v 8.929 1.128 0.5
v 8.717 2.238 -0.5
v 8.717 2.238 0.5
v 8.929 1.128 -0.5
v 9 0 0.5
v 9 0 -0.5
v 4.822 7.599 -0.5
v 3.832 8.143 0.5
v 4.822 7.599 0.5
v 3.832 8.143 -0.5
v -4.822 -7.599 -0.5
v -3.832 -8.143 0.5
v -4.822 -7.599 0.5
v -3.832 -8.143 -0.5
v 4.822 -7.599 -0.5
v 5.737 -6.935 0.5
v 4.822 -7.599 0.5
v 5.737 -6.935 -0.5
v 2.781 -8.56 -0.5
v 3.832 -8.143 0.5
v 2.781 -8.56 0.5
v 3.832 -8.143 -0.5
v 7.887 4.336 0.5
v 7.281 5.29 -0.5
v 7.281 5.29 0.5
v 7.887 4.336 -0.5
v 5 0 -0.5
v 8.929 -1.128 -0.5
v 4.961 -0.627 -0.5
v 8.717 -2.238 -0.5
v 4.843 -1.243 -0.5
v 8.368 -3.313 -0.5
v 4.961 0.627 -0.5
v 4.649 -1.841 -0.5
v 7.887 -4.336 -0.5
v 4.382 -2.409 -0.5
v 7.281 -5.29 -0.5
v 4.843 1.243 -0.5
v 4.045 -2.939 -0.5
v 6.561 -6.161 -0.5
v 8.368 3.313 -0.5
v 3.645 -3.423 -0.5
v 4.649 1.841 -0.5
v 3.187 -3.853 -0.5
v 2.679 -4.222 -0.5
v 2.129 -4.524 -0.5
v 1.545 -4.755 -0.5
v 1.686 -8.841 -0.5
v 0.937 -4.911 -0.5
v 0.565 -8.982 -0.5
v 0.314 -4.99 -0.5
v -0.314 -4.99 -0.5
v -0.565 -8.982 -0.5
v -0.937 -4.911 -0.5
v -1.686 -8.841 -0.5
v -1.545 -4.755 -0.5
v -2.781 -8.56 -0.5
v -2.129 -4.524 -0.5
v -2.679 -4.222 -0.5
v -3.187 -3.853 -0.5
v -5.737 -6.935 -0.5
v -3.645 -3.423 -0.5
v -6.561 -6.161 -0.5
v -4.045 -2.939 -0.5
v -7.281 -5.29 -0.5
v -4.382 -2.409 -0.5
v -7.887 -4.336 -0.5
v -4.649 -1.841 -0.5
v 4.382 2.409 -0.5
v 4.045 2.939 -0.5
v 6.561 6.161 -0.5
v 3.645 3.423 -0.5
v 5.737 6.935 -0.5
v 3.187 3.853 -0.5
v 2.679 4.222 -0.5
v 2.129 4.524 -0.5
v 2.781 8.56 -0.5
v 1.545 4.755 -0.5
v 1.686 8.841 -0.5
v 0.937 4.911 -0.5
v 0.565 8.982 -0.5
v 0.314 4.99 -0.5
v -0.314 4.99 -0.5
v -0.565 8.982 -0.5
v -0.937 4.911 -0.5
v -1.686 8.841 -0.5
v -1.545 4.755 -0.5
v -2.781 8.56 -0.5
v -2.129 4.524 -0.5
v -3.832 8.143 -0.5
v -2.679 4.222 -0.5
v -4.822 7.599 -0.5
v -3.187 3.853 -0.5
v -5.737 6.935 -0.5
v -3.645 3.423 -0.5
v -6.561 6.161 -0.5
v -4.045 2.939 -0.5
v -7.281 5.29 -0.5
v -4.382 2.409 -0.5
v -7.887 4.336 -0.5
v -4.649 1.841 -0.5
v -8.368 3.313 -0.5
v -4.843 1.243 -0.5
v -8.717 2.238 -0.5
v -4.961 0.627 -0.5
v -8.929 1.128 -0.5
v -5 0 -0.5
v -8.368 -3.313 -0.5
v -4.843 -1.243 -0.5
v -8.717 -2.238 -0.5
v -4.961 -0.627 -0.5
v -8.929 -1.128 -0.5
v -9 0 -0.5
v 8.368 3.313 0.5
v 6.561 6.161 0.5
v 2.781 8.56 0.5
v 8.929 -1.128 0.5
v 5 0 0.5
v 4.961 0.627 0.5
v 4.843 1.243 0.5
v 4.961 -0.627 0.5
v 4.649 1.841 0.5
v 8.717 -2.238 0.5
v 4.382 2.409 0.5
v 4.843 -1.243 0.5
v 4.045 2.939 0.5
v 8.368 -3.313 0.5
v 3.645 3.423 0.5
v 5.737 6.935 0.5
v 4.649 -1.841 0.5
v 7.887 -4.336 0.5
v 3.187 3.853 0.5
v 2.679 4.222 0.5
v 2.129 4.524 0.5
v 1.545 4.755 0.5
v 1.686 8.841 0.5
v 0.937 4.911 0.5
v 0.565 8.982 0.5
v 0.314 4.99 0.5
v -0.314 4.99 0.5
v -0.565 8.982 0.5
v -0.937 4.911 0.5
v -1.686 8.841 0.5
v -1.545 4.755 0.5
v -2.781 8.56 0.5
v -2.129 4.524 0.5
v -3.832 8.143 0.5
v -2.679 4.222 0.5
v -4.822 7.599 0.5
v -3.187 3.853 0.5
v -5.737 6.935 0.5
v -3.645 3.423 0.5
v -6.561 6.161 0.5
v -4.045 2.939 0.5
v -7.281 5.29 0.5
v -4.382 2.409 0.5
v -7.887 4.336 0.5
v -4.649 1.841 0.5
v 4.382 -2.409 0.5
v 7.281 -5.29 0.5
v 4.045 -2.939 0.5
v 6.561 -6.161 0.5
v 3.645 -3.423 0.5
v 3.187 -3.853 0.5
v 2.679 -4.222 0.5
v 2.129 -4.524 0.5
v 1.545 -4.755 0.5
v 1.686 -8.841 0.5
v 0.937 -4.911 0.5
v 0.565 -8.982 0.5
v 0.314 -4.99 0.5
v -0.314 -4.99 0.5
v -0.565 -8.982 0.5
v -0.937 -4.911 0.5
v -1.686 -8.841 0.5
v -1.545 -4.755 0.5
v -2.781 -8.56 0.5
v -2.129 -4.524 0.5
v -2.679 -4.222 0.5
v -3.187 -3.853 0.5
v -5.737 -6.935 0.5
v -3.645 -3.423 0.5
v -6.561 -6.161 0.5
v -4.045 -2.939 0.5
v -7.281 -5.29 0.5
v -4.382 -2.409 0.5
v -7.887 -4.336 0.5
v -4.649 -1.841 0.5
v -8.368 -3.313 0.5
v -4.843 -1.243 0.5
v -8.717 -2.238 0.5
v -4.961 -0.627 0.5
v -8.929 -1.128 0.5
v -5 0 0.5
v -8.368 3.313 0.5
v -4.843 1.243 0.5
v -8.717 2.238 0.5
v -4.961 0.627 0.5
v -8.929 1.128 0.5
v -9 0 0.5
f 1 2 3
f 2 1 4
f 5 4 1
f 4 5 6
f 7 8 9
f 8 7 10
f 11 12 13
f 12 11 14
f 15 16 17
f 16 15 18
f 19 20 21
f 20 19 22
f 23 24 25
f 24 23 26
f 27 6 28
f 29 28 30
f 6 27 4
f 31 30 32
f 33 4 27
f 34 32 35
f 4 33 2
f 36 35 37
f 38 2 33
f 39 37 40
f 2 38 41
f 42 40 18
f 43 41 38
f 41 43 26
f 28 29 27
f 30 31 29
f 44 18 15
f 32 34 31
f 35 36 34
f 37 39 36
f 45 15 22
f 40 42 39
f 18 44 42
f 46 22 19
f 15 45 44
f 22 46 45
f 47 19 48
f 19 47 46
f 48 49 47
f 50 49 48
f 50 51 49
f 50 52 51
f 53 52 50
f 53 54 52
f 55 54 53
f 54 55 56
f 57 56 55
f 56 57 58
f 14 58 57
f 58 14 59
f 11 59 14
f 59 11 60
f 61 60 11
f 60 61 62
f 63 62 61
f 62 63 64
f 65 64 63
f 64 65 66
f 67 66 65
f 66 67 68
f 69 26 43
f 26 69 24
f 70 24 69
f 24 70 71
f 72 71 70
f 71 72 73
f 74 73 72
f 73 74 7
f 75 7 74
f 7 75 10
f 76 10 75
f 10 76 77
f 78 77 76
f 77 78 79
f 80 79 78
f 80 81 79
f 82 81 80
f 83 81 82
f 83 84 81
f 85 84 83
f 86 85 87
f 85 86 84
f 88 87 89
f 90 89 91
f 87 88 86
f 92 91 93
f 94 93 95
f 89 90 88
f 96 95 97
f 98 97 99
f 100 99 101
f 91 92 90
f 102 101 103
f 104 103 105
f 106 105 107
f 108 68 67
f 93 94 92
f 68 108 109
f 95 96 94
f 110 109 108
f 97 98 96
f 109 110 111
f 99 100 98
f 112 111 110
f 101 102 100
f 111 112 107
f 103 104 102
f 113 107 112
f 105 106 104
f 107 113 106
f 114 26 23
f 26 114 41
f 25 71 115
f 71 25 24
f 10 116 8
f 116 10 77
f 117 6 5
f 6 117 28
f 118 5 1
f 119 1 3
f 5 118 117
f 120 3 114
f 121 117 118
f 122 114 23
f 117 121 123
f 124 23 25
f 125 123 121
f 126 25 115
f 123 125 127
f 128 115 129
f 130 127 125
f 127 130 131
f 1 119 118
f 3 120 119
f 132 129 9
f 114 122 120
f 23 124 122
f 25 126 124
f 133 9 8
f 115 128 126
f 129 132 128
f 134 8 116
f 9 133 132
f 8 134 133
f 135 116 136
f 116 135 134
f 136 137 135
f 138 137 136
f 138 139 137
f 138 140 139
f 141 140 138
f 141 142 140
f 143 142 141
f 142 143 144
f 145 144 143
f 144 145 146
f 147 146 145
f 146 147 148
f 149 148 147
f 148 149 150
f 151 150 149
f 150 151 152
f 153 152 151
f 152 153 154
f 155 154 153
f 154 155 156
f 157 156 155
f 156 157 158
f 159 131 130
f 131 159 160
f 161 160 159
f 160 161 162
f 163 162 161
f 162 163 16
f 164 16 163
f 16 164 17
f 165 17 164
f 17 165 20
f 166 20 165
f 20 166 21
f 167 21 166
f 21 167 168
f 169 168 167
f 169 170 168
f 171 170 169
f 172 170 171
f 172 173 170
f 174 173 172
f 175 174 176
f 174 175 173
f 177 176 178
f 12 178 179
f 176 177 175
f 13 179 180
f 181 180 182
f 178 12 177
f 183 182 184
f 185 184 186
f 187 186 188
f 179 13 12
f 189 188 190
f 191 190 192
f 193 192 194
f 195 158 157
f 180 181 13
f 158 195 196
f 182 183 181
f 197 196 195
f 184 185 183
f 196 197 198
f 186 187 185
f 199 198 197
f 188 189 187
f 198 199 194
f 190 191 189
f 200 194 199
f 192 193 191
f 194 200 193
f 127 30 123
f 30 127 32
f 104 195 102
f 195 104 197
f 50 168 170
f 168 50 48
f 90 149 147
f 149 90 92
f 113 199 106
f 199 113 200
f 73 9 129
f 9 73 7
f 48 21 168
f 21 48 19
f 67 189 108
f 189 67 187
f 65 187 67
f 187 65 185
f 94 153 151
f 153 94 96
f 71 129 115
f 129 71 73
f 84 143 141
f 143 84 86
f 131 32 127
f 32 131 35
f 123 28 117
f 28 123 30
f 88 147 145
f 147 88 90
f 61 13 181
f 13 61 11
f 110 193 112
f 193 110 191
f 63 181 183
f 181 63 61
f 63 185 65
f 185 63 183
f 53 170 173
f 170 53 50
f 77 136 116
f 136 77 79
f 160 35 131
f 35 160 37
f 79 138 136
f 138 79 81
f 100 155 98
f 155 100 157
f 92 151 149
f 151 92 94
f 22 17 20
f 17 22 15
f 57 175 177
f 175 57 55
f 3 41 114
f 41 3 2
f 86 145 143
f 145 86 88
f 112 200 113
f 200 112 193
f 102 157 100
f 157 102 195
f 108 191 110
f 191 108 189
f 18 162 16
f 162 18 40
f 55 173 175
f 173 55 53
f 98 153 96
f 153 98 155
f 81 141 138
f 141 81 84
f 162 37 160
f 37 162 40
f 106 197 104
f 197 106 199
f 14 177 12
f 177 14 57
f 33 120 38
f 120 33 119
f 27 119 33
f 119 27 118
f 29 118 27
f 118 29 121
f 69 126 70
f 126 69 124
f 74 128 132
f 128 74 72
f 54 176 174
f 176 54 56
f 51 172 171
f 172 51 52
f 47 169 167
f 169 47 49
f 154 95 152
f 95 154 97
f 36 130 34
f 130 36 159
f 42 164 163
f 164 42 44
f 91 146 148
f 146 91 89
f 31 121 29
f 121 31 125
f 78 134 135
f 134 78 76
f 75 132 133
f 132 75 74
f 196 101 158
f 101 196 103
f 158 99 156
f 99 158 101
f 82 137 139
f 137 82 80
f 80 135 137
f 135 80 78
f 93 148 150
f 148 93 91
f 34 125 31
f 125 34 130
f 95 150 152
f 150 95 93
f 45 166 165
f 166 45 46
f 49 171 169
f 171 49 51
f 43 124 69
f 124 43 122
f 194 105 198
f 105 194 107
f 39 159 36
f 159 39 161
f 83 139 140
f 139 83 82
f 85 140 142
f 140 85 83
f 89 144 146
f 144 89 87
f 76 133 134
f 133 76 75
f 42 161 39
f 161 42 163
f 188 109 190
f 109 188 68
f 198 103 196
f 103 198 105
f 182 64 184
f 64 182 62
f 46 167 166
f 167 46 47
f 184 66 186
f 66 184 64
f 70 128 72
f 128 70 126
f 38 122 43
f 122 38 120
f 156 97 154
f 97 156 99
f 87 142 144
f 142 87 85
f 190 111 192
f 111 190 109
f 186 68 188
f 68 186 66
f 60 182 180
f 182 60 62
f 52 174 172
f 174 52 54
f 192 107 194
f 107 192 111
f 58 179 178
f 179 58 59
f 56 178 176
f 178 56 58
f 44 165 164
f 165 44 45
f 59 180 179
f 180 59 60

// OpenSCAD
$fn = 50;


difference() {
	union() {
		translate(v = [0, 0, -0.5000000000]) {
			cylinder(h = 1, r = 9.0000000000);
		}
	}
	union() {
		translate(v = [0, 0, -100.0000000000]) {
			cylinder(h = 200, r = 5.0000000000);
		}
	}
}
